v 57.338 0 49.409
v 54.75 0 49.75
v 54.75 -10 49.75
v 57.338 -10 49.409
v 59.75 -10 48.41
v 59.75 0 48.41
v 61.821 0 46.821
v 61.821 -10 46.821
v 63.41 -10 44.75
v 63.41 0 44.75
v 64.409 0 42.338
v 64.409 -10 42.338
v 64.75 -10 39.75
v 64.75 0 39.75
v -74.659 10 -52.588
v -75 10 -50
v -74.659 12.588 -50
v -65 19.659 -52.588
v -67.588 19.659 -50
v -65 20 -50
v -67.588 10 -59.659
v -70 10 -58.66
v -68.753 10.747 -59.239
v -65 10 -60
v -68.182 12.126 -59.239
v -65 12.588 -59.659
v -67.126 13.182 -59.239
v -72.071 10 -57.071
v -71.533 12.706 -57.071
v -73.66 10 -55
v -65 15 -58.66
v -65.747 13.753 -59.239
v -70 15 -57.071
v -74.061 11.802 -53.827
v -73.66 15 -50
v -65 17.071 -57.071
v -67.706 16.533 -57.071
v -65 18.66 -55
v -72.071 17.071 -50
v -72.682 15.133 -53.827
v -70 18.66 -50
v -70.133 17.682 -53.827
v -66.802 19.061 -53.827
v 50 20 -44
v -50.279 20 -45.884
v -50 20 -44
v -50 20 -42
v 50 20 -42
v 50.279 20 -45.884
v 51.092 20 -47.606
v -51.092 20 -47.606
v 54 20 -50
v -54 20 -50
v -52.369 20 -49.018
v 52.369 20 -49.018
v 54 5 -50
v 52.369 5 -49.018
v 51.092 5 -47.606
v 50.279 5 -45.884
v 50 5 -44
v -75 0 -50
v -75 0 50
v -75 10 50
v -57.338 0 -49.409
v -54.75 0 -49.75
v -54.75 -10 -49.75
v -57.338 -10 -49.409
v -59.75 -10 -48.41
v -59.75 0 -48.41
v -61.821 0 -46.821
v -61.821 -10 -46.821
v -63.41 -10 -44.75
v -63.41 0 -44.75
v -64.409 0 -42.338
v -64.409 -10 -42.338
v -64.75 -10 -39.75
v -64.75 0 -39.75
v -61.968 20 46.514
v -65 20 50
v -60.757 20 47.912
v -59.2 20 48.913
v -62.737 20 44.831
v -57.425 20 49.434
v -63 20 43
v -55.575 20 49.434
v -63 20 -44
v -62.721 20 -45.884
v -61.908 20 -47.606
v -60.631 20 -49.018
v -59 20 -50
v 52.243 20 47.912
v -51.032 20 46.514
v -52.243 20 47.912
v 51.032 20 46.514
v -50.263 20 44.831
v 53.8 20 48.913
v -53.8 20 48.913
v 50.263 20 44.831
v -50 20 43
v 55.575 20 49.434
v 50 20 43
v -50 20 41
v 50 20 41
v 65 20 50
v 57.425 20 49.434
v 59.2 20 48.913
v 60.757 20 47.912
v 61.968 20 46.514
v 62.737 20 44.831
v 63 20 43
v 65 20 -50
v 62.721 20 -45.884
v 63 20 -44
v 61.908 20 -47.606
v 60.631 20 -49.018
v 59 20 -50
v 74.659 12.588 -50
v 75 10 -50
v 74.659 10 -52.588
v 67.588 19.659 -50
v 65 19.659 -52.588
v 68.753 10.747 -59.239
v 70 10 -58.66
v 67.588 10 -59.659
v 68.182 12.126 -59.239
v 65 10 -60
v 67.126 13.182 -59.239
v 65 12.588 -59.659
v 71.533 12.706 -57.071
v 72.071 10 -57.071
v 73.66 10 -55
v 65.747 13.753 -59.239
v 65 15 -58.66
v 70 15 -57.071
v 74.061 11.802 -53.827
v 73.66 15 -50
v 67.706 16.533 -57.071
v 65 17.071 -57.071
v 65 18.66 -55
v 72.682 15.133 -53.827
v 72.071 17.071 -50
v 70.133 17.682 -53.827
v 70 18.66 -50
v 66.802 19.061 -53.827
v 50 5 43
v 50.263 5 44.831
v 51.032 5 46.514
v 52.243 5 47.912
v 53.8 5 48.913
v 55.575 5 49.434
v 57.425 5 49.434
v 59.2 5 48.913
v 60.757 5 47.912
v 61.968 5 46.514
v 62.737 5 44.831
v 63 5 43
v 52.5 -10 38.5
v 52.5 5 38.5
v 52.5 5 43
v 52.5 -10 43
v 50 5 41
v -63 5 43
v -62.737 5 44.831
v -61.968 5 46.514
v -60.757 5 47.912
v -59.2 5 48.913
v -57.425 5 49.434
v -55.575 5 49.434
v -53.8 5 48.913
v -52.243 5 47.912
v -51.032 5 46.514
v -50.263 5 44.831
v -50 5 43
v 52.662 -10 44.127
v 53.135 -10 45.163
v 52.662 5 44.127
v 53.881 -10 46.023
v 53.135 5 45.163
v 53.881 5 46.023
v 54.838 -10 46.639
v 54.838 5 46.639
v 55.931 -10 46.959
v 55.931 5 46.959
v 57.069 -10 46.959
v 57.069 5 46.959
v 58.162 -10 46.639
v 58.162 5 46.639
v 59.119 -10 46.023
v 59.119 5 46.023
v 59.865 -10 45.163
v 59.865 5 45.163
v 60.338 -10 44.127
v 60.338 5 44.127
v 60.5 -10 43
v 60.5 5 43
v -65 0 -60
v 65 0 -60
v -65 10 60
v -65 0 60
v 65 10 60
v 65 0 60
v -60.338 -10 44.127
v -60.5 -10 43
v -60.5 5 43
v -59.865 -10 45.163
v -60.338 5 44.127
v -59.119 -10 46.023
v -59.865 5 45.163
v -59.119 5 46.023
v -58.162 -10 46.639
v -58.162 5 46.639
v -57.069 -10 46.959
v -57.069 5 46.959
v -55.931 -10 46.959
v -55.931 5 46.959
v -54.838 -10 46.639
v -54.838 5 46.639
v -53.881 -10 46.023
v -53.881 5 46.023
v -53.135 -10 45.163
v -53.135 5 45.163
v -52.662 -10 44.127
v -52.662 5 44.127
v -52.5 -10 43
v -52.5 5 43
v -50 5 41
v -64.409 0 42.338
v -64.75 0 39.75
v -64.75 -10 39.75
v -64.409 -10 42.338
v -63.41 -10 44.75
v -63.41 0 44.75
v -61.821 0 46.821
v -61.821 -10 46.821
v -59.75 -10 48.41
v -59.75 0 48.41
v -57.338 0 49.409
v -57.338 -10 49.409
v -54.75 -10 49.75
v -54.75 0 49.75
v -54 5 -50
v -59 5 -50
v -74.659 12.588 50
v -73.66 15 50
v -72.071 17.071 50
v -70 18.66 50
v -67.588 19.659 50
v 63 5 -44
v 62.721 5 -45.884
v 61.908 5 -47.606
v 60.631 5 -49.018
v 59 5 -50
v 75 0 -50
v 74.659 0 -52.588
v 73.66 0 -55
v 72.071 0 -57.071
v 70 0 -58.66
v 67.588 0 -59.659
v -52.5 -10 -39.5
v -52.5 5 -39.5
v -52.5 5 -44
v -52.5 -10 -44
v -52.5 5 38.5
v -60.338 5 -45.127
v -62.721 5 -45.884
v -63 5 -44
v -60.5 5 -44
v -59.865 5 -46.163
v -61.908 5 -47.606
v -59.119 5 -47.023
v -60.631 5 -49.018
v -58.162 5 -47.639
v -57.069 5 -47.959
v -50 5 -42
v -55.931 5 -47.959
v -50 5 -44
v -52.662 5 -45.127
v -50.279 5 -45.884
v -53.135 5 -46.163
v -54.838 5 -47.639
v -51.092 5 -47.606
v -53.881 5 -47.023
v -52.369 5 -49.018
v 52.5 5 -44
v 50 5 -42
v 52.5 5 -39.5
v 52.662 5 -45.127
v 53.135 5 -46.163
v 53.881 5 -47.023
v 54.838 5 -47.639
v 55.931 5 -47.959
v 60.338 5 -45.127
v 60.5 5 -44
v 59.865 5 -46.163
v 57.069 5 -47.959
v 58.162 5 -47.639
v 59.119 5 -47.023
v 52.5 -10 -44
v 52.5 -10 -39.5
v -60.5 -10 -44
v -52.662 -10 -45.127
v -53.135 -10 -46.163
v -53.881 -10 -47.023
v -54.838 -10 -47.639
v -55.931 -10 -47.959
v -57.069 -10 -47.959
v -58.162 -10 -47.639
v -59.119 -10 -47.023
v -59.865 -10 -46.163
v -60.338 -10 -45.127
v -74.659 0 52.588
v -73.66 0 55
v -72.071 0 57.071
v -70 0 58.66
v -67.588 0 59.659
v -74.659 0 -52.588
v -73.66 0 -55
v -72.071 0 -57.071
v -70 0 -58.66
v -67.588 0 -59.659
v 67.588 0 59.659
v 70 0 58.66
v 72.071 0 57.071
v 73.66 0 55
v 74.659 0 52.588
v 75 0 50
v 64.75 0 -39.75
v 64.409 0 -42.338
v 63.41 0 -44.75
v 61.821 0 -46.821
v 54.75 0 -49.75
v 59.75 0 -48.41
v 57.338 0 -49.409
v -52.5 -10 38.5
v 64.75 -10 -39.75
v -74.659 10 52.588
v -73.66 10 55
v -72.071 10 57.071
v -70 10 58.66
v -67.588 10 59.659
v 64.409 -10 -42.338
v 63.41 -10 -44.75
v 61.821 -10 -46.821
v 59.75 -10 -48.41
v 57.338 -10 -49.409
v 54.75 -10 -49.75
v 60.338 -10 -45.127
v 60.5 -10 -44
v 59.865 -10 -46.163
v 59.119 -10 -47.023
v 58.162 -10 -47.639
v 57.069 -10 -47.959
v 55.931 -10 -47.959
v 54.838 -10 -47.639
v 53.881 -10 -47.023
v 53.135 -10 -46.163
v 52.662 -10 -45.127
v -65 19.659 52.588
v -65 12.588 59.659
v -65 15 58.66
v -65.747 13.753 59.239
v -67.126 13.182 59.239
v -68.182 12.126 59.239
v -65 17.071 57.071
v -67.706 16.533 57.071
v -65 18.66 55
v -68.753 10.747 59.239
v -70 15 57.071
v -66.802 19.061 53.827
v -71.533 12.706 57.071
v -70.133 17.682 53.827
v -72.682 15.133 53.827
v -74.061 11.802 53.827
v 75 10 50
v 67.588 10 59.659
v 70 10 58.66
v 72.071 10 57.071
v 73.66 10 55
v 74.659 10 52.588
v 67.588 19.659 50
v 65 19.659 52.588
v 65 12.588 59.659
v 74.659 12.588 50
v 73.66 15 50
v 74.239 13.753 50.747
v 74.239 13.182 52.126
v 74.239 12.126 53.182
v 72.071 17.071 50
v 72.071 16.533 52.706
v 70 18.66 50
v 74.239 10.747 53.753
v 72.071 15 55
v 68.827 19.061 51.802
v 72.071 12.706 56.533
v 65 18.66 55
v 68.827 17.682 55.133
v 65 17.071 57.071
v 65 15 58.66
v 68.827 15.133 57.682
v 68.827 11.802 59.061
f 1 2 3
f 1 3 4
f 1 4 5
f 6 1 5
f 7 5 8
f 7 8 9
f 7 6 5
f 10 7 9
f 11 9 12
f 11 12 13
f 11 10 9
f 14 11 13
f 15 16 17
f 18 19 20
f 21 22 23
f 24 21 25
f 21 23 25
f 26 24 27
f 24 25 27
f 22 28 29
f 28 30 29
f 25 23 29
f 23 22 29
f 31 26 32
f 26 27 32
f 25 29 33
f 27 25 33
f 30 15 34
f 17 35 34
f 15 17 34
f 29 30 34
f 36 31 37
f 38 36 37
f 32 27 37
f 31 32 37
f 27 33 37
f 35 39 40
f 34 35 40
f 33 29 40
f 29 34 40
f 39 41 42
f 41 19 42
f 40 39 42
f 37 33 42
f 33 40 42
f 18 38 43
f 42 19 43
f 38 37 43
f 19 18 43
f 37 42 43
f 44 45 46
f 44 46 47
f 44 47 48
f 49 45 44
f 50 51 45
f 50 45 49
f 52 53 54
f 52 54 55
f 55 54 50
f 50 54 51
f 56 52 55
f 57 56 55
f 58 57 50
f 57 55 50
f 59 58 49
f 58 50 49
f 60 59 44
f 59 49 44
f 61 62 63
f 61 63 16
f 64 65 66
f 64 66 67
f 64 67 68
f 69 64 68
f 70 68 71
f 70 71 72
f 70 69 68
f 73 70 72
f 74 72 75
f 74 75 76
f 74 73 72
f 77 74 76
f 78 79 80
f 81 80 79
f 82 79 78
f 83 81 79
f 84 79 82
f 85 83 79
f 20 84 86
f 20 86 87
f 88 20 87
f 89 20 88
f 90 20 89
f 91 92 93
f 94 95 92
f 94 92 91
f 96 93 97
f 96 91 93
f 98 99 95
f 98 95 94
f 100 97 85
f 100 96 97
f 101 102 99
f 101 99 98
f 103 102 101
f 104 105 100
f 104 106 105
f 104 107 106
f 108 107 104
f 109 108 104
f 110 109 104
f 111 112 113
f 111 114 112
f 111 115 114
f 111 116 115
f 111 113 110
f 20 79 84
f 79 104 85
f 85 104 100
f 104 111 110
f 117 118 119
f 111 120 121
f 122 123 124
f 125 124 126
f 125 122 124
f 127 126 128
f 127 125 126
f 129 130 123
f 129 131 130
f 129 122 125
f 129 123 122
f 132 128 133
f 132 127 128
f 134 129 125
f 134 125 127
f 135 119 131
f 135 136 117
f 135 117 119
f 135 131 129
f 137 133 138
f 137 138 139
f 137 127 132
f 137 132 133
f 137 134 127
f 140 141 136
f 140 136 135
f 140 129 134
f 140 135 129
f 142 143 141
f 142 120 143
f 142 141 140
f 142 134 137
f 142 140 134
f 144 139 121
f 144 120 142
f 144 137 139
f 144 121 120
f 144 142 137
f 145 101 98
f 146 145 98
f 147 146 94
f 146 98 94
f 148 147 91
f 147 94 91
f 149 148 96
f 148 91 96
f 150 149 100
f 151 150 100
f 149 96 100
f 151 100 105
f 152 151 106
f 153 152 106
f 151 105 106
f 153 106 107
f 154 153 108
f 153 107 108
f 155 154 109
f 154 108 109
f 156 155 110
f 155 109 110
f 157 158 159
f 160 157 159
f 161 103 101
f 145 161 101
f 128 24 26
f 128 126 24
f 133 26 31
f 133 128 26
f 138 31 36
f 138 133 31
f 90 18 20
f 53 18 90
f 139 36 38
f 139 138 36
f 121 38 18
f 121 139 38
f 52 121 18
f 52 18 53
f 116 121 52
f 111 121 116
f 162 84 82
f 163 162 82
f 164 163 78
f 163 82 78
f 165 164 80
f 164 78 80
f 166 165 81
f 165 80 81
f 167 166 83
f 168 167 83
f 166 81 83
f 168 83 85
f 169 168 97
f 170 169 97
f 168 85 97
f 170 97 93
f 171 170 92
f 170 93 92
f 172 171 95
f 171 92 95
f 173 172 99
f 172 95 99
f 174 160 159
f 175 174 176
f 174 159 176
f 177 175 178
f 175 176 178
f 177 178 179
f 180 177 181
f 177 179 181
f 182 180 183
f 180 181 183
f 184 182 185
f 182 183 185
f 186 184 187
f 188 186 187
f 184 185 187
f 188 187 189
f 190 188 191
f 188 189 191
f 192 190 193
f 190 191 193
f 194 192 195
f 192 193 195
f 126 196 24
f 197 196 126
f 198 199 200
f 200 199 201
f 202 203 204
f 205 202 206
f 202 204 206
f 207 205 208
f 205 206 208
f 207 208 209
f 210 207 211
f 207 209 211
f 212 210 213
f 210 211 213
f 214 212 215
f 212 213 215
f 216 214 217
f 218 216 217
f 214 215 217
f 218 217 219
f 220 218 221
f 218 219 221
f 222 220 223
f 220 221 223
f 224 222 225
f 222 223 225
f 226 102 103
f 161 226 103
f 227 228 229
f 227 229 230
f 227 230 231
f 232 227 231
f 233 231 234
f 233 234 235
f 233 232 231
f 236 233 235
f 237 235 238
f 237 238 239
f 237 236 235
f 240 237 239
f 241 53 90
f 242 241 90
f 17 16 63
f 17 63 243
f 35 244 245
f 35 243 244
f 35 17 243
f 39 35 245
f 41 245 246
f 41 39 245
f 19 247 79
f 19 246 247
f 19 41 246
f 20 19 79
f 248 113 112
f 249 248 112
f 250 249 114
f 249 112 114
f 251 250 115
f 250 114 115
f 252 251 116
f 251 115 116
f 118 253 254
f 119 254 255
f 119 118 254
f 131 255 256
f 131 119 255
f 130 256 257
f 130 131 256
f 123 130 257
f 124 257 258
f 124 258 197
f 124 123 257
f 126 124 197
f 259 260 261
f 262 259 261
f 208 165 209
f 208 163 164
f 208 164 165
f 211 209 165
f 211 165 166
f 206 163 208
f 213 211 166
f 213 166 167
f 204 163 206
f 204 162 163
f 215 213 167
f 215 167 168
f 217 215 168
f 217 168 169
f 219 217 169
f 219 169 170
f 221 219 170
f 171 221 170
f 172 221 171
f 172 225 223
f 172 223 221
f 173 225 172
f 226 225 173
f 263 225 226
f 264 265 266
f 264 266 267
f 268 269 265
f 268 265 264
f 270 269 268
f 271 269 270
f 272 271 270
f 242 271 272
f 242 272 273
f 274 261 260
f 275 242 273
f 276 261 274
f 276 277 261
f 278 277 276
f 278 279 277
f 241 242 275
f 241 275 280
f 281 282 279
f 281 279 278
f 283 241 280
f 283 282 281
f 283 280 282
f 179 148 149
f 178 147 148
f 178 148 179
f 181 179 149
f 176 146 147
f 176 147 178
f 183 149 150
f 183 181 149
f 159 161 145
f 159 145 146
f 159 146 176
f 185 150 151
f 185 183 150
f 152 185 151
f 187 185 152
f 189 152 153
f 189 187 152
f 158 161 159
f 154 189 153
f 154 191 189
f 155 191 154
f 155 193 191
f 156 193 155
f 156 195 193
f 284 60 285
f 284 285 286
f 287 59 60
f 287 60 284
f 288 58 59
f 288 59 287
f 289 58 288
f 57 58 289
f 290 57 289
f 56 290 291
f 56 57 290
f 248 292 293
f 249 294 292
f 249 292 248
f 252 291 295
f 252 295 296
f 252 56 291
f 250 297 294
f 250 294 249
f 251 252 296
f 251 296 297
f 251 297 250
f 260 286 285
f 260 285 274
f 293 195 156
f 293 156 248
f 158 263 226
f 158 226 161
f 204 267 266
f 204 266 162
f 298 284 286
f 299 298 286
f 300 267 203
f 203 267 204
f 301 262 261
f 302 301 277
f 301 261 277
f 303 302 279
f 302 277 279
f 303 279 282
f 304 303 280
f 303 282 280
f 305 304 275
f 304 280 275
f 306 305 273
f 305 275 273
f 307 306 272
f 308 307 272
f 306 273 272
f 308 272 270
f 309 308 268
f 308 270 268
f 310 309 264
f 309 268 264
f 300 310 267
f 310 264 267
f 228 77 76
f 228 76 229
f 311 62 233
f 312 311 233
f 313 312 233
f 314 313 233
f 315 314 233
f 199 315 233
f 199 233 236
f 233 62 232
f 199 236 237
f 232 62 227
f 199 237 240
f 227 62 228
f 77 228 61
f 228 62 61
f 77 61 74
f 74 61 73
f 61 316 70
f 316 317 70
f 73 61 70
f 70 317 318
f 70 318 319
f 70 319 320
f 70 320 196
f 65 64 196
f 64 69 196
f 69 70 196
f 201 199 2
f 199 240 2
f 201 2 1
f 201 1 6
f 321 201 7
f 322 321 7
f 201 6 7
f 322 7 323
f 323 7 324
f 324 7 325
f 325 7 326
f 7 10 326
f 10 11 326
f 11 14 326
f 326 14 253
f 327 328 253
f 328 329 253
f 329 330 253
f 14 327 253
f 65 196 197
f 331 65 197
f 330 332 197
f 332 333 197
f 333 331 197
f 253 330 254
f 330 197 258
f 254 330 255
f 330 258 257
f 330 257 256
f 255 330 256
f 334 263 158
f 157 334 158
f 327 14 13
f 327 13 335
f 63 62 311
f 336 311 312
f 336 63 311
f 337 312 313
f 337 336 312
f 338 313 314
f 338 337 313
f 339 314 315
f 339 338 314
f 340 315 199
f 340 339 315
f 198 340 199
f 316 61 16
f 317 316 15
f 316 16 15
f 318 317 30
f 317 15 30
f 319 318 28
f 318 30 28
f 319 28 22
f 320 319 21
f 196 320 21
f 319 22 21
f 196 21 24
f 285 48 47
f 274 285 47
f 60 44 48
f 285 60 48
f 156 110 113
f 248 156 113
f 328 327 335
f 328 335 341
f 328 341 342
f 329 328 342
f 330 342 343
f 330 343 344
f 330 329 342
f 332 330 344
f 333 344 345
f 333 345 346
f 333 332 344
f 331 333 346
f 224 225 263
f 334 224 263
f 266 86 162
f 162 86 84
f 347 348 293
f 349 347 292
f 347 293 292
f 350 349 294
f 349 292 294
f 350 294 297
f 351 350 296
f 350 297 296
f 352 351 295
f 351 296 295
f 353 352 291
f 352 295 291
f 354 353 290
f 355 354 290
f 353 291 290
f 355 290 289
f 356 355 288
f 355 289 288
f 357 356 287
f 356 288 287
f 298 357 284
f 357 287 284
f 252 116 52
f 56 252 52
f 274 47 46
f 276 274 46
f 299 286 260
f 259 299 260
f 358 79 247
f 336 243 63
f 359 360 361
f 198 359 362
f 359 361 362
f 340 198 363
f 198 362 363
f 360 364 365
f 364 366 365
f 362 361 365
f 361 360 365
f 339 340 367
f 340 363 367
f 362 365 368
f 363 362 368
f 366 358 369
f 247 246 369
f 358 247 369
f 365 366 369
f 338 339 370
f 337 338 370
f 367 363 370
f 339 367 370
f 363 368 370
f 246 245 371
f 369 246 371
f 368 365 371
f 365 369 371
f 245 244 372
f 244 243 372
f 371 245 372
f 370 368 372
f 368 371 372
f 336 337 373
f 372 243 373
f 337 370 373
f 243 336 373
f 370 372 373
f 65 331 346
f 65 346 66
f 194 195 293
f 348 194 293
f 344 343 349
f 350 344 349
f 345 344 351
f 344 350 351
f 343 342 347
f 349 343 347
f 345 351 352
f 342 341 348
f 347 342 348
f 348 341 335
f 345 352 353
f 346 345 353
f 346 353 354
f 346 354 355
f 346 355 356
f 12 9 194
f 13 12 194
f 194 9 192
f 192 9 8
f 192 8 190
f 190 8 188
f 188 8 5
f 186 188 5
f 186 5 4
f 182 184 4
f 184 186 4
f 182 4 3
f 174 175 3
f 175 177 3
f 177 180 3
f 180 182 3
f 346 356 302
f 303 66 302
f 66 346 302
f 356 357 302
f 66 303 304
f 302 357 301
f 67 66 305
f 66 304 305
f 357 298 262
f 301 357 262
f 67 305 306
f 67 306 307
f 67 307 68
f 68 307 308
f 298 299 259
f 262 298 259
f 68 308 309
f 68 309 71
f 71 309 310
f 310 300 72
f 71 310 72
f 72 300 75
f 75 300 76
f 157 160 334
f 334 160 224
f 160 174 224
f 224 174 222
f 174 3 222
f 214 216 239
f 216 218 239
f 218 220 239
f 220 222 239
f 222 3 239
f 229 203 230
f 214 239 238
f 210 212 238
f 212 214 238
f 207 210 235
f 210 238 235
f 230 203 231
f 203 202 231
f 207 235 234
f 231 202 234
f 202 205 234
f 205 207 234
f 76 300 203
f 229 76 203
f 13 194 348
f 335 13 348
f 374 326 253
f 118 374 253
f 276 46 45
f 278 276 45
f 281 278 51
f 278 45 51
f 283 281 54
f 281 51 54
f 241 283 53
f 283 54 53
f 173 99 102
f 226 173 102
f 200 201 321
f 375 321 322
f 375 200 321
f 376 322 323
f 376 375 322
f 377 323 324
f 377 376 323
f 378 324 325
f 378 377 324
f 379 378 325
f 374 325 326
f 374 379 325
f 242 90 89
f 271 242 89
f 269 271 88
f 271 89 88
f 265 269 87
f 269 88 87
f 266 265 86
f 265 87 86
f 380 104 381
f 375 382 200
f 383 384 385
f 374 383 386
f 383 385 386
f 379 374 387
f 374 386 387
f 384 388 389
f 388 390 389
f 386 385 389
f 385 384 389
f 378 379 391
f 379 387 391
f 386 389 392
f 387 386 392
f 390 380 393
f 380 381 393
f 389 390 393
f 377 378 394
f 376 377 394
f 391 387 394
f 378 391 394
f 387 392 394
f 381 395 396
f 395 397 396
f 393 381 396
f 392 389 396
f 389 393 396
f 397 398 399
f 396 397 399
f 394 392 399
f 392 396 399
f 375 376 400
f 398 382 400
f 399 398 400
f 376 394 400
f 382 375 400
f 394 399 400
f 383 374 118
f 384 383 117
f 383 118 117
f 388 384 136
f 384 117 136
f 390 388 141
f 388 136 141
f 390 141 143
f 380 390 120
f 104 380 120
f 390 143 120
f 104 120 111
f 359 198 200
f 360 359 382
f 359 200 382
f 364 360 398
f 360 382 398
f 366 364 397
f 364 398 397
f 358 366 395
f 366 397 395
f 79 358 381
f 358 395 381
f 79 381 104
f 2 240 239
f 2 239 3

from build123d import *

# Parameters (mm, degrees)
SKETCH2_W           = 150
SKETCH2_H           = 120
BOSS_EXTRUDE1_DEPTH = 20
FILLET1_R           = 10
BOSS_EXTRUDE2_DEPTH = 10
CUT_EXTRUDE1_DEPTH  = 30
CUT_EXTRUDE2_DEPTH  = 15


with BuildPart() as part:
    # Sketch2 → Boss-Extrude1 (new body)
    with BuildSketch(Plane(origin=(0, 0, 0), x_dir=(1, 0, 0), z_dir=(0, 1, 0))):
        Rectangle(SKETCH2_W, SKETCH2_H)
    extrude(amount=BOSS_EXTRUDE1_DEPTH)

    # Fillet1
    fillet1_edges = [part.edges().sort_by_distance(p)[0] for p in [
        (-75, 20, 0),
        (0, 20, 60),
        (75, 20, 0),
        (75, 10, 60),
        (-75, 10, 60),
        (-75, 10, -60),
        (75, 10, -60),
        (0, 20, -60),
    ]]
    fillet(fillet1_edges, radius=FILLET1_R)

    # Sketch3 → Boss-Extrude2 (add)
    with BuildSketch(Plane.XZ):
        with BuildLine():
            ThreePointArc((-64.75, 39.75), (-61.821067812, 46.821067812), (-54.75, 49.75))
            Line((-54.75, 49.75), (54.75, 49.75))
            ThreePointArc((54.75, 49.75), (61.821067812, 46.821067812), (64.75, 39.75))
            Line((64.75, 39.75), (64.75, -39.75))
            ThreePointArc((64.75, -39.75), (61.821067812, -46.821067812), (54.75, -49.75))
            Line((54.75, -49.75), (-54.75, -49.75))
            ThreePointArc((-54.75, -49.75), (-61.821067812, -46.821067812), (-64.75, -39.75))
            Line((-64.75, -39.75), (-64.75, 39.75))
        make_face()
    extrude(amount=BOSS_EXTRUDE2_DEPTH)

    # Sketch4 → Cut-Extrude1 (cut)
    with BuildSketch(Plane(origin=(0, 20, 0), x_dir=(1, 0, 0), z_dir=(0, 1, 0))):
        with BuildLine():
            Line((52.5, -38.5), (52.5, -43))
            ThreePointArc((52.5, -43), (56.5, -47), (60.5, -43))
            Line((60.5, -43), (60.5, 44))
            ThreePointArc((60.5, 44), (56.5, 48), (52.5, 44))
            Line((52.5, 44), (52.5, 39.5))
            Line((52.5, 39.5), (-52.5, 39.5))
            Line((-52.5, 39.5), (-52.5, 44))
            ThreePointArc((-52.5, 44), (-56.5, 48), (-60.5, 44))
            Line((-60.5, 44), (-60.5, -43.000001))
            ThreePointArc((-60.5, -43.000001), (-56.5, -47.000001), (-52.5, -43.000001))
            Line((-52.5, -43.000001), (-52.5, -38.5))
            Line((-52.5, -38.5), (52.5, -38.5))
        make_face()
    extrude(amount=-CUT_EXTRUDE1_DEPTH, mode=Mode.SUBTRACT)

    # Sketch4<3> → Cut-Extrude2 (cut)
    with BuildSketch(Plane(origin=(0, 20, 0), x_dir=(1, 0, 0), z_dir=(0, 1, 0))):
        with BuildLine():
            Line((-50, -43.000001), (-50, -41))
            Line((-50, -41), (50, -41))
            Line((50, -41), (50, -43))
            ThreePointArc((50, -43), (56.5, -49.5), (63, -43))
            Line((63, -43), (63, 44))
            ThreePointArc((63, 44), (61.908326913, 47.605551275), (59, 50))
            Line((59, 50), (54, 50))
            ThreePointArc((54, 50), (51.091673087, 47.605551275), (50, 44))
            Line((50, 44), (50, 42))
            Line((50, 42), (-50, 42))
            Line((-50, 42), (-50, 44))
            ThreePointArc((-50, 44), (-51.091673087, 47.605551275), (-54, 50))
            Line((-54, 50), (-59, 50))
            ThreePointArc((-59, 50), (-61.908326913, 47.605551275), (-63, 44))
            Line((-63, 44), (-63, -43.000001))
            ThreePointArc((-63, -43.000001), (-56.5, -49.500001), (-50, -43.000001))
        make_face()
        with BuildLine():
            Line((52.5, 39.5), (52.5, 44))
            ThreePointArc((52.5, 44), (56.5, 48), (60.5, 44))
            Line((60.5, 44), (60.5, -43))
            ThreePointArc((60.5, -43), (56.5, -47), (52.5, -43))
            Line((52.5, -43), (52.5, -38.5))
            Line((52.5, -38.5), (-52.5, -38.5))
            Line((-52.5, -38.5), (-52.5, -43.000001))
            ThreePointArc((-52.5, -43.000001), (-56.5, -47.000001), (-60.5, -43.000001))
            Line((-60.5, -43.000001), (-60.5, 44))
            ThreePointArc((-60.5, 44), (-56.5, 48), (-52.5, 44))
            Line((-52.5, 44), (-52.5, 39.5))
            Line((-52.5, 39.5), (52.5, 39.5))
        make_face(mode=Mode.SUBTRACT)
    extrude(amount=-CUT_EXTRUDE2_DEPTH, mode=Mode.SUBTRACT)


solid = part.part
